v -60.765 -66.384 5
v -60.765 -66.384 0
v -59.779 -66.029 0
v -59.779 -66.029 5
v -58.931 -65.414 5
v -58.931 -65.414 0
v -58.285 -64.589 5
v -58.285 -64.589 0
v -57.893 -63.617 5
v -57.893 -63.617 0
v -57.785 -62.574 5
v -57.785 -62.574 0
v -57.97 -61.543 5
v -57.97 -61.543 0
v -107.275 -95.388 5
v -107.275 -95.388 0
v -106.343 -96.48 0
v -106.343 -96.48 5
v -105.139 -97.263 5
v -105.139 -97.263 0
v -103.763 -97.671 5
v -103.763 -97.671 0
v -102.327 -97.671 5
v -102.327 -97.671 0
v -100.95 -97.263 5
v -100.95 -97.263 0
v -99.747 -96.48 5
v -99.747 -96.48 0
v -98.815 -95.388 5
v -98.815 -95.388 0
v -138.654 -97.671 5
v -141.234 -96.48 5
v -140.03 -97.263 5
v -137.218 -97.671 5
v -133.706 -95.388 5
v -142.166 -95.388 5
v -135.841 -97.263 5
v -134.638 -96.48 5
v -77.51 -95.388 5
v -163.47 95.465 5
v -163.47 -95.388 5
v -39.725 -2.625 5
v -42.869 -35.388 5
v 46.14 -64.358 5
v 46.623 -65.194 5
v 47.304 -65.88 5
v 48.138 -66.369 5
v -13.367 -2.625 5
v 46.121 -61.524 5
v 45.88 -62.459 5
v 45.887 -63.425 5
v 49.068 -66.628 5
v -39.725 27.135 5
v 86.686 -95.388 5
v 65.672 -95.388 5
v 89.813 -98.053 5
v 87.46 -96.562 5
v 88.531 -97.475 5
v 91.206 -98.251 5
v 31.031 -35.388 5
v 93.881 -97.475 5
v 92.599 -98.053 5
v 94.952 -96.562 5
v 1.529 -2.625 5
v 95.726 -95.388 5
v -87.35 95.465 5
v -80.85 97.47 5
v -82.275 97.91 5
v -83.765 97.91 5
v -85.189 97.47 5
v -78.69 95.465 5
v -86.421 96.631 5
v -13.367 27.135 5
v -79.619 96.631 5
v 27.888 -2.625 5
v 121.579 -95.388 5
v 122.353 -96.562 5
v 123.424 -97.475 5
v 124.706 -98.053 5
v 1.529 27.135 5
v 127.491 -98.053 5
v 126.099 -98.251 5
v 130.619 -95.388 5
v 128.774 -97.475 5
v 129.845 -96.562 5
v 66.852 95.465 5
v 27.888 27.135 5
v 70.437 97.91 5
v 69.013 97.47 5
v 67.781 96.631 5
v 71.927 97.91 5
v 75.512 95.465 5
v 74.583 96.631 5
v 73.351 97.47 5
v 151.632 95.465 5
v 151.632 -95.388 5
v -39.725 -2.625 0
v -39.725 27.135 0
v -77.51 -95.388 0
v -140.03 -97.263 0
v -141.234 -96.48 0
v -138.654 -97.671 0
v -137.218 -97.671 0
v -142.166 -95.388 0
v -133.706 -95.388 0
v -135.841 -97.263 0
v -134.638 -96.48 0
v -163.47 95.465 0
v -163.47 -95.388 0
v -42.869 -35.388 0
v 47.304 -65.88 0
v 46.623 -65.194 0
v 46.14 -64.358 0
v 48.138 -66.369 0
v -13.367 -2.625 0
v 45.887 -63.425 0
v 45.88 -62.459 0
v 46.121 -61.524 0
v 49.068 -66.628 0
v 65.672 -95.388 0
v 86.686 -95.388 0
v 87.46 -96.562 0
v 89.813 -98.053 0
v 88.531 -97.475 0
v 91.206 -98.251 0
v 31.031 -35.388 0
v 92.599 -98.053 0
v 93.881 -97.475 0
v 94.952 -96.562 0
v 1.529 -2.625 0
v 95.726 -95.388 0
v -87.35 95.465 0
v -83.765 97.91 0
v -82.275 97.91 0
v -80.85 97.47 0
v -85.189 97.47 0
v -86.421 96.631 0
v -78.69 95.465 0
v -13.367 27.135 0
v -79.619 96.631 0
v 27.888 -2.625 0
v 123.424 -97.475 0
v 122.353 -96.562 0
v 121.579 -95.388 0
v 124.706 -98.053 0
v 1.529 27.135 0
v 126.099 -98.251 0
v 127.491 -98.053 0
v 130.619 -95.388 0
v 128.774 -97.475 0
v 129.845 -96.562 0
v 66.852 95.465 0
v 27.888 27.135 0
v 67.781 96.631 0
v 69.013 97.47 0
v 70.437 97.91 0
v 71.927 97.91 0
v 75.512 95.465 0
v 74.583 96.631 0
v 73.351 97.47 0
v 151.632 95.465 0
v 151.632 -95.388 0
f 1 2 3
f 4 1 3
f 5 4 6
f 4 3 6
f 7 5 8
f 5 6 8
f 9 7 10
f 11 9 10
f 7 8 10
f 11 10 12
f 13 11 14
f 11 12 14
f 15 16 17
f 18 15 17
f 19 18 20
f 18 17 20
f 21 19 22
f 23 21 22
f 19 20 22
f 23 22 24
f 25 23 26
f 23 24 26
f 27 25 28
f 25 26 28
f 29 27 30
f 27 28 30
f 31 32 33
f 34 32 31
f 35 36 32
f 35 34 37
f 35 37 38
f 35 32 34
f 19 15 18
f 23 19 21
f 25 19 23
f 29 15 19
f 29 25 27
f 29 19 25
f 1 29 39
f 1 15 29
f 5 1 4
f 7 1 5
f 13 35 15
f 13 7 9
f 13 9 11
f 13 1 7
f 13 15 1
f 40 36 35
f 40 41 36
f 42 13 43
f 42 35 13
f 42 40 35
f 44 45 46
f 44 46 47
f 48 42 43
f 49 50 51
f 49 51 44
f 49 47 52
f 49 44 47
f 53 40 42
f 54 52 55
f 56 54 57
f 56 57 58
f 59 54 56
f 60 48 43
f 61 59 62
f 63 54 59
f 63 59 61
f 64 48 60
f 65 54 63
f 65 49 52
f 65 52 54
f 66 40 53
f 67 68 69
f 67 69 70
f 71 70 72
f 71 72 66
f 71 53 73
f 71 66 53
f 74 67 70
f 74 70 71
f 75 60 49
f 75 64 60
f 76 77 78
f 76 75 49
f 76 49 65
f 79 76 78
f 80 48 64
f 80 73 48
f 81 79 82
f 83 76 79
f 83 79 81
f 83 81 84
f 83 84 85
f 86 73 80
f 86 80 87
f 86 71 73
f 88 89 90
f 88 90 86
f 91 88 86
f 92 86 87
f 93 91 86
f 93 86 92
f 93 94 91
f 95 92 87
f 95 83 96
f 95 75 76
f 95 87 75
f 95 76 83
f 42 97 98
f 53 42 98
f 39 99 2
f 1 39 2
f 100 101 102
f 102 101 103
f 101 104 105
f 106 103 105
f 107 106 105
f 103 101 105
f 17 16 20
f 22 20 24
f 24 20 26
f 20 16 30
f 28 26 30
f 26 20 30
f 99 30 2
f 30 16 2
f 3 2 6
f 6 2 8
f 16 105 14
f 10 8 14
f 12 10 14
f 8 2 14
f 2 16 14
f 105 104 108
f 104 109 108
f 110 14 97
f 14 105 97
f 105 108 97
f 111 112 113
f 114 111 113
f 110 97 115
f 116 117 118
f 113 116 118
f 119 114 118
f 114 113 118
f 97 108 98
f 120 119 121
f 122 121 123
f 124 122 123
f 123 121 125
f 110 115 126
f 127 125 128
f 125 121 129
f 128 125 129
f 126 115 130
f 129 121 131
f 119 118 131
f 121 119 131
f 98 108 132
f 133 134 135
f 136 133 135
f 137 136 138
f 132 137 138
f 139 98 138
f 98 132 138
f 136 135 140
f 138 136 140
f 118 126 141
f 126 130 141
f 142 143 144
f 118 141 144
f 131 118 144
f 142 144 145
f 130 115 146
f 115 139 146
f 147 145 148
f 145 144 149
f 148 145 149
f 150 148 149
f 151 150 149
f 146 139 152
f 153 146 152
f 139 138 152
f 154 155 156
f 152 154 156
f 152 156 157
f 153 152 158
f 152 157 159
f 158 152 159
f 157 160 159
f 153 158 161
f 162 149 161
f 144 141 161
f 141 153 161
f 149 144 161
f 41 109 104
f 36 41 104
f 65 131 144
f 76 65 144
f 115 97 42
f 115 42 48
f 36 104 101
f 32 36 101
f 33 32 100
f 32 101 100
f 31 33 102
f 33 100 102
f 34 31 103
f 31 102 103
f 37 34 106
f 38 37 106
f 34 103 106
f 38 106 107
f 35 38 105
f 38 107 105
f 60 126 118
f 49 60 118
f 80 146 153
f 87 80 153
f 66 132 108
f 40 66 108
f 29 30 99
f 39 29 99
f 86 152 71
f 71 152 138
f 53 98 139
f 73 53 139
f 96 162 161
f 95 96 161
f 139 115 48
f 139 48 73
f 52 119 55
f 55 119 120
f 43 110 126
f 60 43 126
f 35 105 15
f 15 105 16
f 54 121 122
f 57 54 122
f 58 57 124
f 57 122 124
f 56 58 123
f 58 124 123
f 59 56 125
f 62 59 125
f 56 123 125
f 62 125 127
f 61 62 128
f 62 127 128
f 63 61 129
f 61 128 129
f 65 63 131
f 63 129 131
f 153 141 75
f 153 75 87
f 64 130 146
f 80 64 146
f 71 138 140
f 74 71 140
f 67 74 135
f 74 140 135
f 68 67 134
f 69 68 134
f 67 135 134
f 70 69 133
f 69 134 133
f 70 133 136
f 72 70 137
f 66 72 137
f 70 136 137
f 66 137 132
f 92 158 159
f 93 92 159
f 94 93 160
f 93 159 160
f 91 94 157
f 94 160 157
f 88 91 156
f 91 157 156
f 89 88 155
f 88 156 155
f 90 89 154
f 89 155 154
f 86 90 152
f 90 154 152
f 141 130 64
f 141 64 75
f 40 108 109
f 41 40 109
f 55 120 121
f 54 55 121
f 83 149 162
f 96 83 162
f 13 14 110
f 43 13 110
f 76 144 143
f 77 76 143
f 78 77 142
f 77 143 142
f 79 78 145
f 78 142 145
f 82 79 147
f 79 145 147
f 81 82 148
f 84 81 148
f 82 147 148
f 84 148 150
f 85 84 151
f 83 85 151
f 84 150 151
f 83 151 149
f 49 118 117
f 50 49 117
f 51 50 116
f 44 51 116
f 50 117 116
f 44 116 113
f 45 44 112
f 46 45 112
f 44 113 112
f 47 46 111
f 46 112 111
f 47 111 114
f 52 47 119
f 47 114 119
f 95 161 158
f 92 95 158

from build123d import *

# Parameters (mm, degrees)
SKETCH1_W           = 26.358753283
SKETCH1_H           = 29.759882739
BOSS_EXTRUDE1_DEPTH = 5


with BuildPart() as part:
    # Sketch1 → Boss-Extrude1 (new body)
    with BuildSketch(Plane.XY):
        with BuildLine():
            Line((-133.705700246, -95.388044307), (-107.275003874, -95.388044307))
            ThreePointArc((-107.275003874, -95.388044307), (-103.044823488, -97.722416069), (-98.814643102, -95.388044307))
            Line((-98.814643102, -95.388044307), (-77.510422411, -95.388044307))
            Line((-77.510422411, -95.388044307), (-60.765070658, -66.384244279))
            ThreePointArc((-60.765070658, -66.384244279), (-58.284996417, -64.588629688), (-57.969985686, -61.543015096))
            Line((-57.969985686, -61.543015096), (-42.86940626, -35.388044307))
            Line((-42.86940626, -35.388044307), (31.031428196, -35.388044307))
            Line((31.031428196, -35.388044307), (46.120827825, -61.523651119))
            ThreePointArc((46.120827825, -61.523651119), (46.354900962, -64.791664092), (49.068046647, -66.628383861))
            Line((49.068046647, -66.628383861), (65.672444348, -95.388044307))
            Line((65.672444348, -95.388044307), (86.685893367, -95.388044307))
            ThreePointArc((86.685893367, -95.388044307), (91.206010968, -98.250630713), (95.726128569, -95.388044307))
            Line((95.726128569, -95.388044307), (121.578619423, -95.388044307))
            ThreePointArc((121.578619423, -95.388044307), (126.098737025, -98.250630713), (130.618854626, -95.388044307))
            Line((130.618854626, -95.388044307), (151.632303645, -95.388044307))
            Line((151.632303645, -95.388044307), (151.632303645, 95.46540018))
            Line((151.632303645, 95.46540018), (75.512150198, 95.46540018))
            ThreePointArc((75.512150198, 95.46540018), (71.182023179, 97.96540018), (66.85189616, 95.46540018))
            Line((66.85189616, 95.46540018), (-78.689780736, 95.46540018))
            ThreePointArc((-78.689780736, 95.46540018), (-83.019907754, 97.96540018), (-87.350034773, 95.46540018))
            Line((-87.350034773, 95.46540018), (-163.470281709, 95.46540018))
            Line((-163.470281709, 95.46540018), (-163.470281709, -95.388044307))
            Line((-163.470281709, -95.388044307), (-142.166061018, -95.388044307))
            ThreePointArc((-142.166061018, -95.388044307), (-137.935880632, -97.722416069), (-133.705700246, -95.388044307))
        make_face()
        with Locations((-26.546016438, 12.255373732)):
            Rectangle(SKETCH1_W, SKETCH1_H, mode=Mode.SUBTRACT)
        with Locations((14.708131863, 12.255373732)):
            Rectangle(SKETCH1_W, SKETCH1_H, mode=Mode.SUBTRACT)
    extrude(amount=BOSS_EXTRUDE1_DEPTH)


solid = part.part
